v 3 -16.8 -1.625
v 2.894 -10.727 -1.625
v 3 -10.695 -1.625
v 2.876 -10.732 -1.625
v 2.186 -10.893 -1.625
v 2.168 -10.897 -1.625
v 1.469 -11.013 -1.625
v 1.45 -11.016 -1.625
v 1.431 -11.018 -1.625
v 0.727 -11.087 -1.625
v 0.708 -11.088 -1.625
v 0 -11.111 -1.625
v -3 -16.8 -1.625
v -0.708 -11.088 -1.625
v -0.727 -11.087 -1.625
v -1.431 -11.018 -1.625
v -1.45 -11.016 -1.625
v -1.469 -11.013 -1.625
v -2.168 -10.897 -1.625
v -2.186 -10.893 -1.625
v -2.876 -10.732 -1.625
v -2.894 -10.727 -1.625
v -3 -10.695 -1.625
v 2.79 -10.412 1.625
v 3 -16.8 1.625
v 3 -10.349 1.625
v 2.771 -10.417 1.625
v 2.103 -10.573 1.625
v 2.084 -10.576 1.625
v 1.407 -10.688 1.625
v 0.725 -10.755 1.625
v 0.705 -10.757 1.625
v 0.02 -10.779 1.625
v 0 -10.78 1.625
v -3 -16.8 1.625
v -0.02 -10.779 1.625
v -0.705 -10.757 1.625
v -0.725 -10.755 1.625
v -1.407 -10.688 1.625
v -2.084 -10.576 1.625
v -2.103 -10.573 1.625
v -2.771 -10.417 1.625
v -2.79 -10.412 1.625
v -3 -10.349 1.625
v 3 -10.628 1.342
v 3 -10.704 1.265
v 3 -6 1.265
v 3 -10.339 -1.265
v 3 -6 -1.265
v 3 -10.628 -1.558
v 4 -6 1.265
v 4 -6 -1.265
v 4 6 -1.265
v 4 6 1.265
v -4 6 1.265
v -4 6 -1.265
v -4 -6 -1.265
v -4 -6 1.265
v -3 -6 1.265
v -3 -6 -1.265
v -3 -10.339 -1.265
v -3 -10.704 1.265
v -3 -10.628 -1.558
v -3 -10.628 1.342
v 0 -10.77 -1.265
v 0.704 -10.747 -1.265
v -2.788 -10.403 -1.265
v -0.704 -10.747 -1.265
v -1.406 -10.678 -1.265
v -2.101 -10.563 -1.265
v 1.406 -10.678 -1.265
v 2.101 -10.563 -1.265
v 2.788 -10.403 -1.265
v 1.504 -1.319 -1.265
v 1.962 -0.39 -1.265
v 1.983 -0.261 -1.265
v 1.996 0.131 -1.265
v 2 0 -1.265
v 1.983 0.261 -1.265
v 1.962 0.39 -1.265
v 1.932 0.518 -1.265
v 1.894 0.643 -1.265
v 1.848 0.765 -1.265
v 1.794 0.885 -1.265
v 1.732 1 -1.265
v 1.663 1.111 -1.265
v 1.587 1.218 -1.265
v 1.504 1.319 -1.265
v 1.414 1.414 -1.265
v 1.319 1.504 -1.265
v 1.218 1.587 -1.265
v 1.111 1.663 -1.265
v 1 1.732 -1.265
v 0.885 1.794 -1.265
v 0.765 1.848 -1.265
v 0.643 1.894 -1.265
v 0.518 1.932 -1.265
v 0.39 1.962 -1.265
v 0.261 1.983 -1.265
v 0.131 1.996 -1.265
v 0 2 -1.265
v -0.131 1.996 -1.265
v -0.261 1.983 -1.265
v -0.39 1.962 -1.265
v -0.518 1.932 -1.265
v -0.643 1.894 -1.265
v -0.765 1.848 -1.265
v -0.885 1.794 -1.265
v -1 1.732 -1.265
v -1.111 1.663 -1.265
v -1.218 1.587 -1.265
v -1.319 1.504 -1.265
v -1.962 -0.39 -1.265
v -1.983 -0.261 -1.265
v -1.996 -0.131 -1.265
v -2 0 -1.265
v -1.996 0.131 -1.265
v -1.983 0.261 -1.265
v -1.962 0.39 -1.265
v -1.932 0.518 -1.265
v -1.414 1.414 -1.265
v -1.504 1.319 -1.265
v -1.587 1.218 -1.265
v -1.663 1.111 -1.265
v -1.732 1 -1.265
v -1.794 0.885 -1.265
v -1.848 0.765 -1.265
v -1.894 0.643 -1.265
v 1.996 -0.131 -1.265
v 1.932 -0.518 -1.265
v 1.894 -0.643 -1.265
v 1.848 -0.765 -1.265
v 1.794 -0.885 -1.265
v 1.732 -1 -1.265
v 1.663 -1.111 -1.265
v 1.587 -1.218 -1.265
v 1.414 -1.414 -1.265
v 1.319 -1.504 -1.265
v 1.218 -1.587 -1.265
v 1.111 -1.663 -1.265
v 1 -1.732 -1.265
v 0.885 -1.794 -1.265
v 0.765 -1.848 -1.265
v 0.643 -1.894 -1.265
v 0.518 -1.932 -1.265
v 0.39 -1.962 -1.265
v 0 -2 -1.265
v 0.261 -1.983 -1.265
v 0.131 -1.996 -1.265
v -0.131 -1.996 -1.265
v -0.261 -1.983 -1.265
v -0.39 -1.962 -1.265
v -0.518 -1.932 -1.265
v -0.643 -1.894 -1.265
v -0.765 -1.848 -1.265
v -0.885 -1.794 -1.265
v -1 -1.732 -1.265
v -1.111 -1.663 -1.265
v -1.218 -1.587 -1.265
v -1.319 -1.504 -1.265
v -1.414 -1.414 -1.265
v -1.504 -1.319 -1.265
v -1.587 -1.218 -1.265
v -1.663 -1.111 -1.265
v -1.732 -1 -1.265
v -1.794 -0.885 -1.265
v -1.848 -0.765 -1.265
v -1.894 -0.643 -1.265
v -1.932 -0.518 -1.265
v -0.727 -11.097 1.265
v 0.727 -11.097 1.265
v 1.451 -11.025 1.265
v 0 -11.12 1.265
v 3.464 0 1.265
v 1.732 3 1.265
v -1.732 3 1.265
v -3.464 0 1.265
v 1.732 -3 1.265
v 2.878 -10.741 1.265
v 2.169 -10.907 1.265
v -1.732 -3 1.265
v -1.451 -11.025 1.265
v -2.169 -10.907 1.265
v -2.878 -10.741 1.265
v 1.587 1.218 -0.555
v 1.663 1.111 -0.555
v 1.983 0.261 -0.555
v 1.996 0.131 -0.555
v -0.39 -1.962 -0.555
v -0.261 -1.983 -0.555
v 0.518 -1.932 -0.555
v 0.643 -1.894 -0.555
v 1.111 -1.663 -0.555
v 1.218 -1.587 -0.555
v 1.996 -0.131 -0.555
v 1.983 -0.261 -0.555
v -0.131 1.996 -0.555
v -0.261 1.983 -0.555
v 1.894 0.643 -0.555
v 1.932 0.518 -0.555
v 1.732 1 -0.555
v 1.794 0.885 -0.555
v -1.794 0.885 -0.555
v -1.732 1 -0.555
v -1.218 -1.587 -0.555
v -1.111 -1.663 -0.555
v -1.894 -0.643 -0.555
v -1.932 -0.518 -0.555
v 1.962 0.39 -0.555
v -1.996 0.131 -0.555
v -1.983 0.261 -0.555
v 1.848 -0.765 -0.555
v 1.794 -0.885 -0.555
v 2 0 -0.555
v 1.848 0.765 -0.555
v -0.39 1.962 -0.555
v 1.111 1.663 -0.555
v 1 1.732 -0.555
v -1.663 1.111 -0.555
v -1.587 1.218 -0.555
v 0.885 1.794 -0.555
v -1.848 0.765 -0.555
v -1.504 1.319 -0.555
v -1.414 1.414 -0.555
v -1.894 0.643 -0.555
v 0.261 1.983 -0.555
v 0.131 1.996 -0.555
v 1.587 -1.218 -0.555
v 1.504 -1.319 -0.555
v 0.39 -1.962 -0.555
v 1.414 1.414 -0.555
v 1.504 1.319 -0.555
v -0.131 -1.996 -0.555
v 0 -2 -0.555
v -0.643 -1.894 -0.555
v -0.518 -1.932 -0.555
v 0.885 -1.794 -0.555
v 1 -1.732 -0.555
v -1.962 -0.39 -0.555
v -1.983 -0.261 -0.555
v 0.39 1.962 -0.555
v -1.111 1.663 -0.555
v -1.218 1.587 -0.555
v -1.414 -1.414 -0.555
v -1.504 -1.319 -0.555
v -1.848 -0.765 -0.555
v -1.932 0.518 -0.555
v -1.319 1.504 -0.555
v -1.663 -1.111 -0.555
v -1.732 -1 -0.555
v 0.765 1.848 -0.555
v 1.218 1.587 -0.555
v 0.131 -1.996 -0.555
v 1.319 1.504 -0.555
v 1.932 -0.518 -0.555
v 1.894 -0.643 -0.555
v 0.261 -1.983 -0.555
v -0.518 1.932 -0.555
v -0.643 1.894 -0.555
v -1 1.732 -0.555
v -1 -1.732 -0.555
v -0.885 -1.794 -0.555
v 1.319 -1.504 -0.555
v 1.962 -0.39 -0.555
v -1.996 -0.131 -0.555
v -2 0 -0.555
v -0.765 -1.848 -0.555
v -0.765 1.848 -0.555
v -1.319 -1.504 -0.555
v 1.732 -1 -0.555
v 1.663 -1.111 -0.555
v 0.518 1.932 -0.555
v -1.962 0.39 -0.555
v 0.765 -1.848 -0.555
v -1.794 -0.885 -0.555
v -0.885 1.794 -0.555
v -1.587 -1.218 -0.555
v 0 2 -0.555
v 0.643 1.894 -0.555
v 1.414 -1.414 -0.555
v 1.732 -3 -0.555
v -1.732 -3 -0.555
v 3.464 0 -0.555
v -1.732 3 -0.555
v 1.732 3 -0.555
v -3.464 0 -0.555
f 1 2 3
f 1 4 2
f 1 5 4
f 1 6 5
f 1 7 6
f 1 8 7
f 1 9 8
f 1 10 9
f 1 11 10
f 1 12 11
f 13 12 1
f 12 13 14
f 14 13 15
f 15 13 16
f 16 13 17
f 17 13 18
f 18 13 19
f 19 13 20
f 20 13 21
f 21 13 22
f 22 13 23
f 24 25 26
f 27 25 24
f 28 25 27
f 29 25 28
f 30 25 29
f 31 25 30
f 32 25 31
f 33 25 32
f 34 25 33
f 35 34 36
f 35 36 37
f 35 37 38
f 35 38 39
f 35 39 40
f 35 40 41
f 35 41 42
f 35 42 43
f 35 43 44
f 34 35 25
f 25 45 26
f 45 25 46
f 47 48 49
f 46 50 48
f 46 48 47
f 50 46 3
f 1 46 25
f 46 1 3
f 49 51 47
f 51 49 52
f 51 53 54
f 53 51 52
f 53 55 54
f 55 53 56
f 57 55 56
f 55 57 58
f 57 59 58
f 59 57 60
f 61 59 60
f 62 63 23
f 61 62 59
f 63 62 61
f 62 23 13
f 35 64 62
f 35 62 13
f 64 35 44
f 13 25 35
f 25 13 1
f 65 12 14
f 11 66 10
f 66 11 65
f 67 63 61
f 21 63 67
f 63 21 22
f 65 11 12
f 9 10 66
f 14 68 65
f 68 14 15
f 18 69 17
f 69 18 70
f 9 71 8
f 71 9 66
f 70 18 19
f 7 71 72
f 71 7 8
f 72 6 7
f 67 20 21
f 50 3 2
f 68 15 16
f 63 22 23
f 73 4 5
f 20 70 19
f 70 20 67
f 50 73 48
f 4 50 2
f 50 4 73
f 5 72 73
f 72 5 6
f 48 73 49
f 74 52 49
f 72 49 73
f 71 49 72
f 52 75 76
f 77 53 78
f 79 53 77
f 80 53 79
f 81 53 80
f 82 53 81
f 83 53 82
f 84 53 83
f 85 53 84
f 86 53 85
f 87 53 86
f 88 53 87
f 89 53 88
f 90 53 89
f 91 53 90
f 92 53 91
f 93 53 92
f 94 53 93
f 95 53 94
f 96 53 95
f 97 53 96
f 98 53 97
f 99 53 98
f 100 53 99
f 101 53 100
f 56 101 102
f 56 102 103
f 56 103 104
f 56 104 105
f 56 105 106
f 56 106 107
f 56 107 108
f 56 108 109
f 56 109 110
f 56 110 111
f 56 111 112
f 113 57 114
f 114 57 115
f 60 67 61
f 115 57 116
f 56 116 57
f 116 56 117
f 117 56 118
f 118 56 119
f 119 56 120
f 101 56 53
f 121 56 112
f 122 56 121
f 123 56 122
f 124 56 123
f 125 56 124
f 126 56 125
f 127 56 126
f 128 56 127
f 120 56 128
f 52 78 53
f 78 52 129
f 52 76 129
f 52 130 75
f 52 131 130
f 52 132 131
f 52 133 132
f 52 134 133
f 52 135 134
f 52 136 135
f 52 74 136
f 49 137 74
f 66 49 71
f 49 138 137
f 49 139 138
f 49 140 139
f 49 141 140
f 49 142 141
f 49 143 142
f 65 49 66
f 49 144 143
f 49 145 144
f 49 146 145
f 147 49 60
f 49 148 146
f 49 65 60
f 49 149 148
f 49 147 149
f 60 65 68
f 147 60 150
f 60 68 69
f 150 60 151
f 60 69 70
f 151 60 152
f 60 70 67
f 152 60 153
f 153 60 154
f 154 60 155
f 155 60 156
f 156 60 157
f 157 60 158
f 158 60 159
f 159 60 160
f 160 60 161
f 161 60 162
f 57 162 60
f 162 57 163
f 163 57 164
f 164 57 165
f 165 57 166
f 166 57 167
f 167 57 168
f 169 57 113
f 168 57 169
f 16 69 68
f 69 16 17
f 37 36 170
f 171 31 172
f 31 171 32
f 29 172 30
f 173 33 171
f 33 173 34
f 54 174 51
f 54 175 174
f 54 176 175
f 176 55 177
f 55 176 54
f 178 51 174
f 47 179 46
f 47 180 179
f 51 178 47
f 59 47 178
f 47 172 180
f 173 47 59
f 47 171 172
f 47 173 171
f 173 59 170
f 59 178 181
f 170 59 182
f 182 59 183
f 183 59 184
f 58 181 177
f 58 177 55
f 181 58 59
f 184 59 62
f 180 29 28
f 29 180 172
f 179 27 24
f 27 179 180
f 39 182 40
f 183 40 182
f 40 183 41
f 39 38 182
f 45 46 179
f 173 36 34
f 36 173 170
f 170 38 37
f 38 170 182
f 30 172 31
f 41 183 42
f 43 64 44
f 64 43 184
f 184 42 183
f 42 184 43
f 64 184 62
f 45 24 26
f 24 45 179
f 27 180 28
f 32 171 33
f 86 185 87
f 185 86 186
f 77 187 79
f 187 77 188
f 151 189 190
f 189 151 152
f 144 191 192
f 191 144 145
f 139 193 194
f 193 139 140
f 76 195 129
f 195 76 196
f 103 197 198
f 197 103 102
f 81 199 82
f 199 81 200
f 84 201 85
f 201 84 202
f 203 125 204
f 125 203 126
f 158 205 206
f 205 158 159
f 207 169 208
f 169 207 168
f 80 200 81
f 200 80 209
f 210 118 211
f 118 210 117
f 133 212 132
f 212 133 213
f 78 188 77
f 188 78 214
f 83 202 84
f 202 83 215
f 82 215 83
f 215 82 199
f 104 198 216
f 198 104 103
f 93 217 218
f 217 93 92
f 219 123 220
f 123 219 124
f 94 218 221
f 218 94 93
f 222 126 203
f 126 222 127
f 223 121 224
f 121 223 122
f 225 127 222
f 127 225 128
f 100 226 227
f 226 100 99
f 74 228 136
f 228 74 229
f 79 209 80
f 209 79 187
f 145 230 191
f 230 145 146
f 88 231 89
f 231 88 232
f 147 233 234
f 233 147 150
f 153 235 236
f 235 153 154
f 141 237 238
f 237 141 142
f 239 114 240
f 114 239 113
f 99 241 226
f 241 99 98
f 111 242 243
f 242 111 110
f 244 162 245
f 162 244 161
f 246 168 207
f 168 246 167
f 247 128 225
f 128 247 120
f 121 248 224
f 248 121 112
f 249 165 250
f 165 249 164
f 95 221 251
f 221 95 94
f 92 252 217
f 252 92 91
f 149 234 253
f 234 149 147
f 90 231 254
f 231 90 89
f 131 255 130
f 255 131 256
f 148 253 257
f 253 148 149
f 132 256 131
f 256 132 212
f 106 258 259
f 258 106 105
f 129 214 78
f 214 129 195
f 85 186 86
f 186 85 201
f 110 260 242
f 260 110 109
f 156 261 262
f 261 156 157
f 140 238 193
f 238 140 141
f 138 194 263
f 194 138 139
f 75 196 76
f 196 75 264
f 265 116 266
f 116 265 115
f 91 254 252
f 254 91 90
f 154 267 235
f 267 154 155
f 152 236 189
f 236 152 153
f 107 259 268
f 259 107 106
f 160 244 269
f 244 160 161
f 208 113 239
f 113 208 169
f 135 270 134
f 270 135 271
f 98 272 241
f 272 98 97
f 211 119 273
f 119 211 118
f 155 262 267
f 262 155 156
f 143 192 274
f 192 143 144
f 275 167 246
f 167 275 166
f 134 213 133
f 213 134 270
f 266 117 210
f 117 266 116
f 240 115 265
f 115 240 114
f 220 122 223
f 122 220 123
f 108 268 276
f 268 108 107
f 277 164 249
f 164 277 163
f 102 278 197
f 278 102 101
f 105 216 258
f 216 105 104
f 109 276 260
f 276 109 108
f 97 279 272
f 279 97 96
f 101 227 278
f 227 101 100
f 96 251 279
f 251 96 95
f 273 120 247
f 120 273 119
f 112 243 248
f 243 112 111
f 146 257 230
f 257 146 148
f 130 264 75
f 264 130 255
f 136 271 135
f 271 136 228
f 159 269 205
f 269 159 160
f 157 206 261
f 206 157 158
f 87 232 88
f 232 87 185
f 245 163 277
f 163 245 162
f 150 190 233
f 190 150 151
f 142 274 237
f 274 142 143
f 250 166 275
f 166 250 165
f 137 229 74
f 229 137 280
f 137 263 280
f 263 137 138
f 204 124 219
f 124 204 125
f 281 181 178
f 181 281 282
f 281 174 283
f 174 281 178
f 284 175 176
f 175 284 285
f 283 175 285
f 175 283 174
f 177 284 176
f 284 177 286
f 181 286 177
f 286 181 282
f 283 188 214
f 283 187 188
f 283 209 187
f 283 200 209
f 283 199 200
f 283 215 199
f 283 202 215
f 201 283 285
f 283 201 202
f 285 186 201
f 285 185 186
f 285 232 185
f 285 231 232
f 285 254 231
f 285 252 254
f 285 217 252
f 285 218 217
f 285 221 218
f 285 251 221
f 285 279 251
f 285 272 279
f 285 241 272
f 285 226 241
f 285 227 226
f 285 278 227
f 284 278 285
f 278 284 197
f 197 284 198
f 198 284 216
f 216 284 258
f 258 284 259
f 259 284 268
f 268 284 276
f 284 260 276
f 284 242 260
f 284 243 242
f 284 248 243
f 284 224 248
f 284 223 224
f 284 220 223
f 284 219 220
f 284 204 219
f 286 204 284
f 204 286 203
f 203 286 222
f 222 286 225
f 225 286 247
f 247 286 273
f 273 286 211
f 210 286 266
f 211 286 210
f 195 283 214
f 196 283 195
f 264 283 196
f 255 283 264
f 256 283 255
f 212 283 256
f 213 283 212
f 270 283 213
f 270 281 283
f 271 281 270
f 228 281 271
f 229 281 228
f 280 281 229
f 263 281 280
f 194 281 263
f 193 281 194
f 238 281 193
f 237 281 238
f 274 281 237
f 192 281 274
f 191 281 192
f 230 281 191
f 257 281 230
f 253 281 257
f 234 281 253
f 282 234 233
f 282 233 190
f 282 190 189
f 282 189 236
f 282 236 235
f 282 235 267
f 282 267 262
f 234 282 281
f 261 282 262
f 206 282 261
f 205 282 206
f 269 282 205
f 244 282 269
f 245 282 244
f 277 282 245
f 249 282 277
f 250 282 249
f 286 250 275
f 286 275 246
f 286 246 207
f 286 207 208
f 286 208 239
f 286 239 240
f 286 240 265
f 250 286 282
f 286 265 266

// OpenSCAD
$fn = 96;

// --- Requested dimensions ---
nut_thickness  = 3.25;  // overall thickness (Z)
hex_af         = 6.0;   // across flats (hex pocket)
screw_diameter = 4.0;   // through hole diameter

// --- T-slot nut body dimensions (parametric, connected "T" profile) ---
t_head_w = 8.0;   // head width (X) that sits in slot
t_head_l = 12.0;  // head length (Y) along slot
t_neck_w = 6.0;   // neck width (X)
t_neck_l = 8.0;   // neck length (Y)

// --- Features ---
hex_pocket_depth = 2.2;   // depth of hex socket from TOP face (<= nut_thickness)
chamfer          = 0.35;  // small edge chamfer (top/bottom)
eps              = 0.02;

// --- Connectivity / overlap control (1-2mm as required) ---
overlap_xy = 1.2; // ensures attached parts intersect in XY (prevents "floating" in top view)

// --- Helpers ---
function hex_r_from_af(af) = af / sqrt(3); // circumradius for a hex with given across-flats

module hex_prism(af, h, center=false) {
    r = hex_r_from_af(af);
    cylinder(h=h, r=r, $fn=6, center=center);
}

module t_body_2d() {
    // True "T": neck extends only to one side of head (anti-rotation geometry)
    // Head centered at origin; neck centered below head.
    union() {
        square([t_head_w, t_head_l], center=true);
        translate([0, -(t_head_l/2 + t_neck_l/2), 0])
            square([t_neck_w, t_neck_l], center=true);
    }
}

module t_slot_nut() {
    difference() {
        // --- ONE connected solid (union) ---
        union() {
            // Main extruded T-body
            linear_extrude(height=nut_thickness, center=true)
                t_body_2d();

            // Added "keeper/plate" block (the previously floating blue part):
            // Attach it to the *bottom end* of the neck with a guaranteed overlap in Y.
            // This preserves the overall design intent while ensuring physical connection.
            plate_w = t_neck_w;          // match neck width
            plate_l = 4.0;               // small rectangular plate length (Y)
            plate_h = nut_thickness;     // same thickness so it is one solid

            // Neck bottom edge (most negative Y) is at: -(t_head_l/2 + t_neck_l)
            // Place plate so its top overlaps the neck by overlap_xy.
            y_neck_bottom = -(t_head_l/2 + t_neck_l);
            y_plate_center = y_neck_bottom - plate_l/2 + overlap_xy;

            translate([0, y_plate_center, 0])
                cube([plate_w, plate_l, plate_h], center=true);
        }

        // --- Subtractions / features ---
        // Through-hole for 4.0mm screw (full cut)
        cylinder(h=nut_thickness + 2, d=screw_diameter, center=true);

        // Hex socket (across flats = 6.0mm) from TOP face
        pocket_h = min(hex_pocket_depth, nut_thickness - eps);
        translate([0, 0, nut_thickness/2 - pocket_h + eps])
            hex_prism(hex_af, pocket_h + 2*eps, center=false);

        // Top/bottom chamfers: subtract shallow frustums sized from body extents
        body_r = sqrt(pow(t_head_w/2, 2) + pow((t_head_l + t_neck_l)/2, 2));
        for (s = [-1, 1]) {
            translate([0, 0, s*(nut_thickness/2 - chamfer/2)])
                cylinder(h=chamfer + eps,
                         r1=body_r + chamfer,
                         r2=body_r,
                         center=true);
        }
    }
}

t_slot_nut();
